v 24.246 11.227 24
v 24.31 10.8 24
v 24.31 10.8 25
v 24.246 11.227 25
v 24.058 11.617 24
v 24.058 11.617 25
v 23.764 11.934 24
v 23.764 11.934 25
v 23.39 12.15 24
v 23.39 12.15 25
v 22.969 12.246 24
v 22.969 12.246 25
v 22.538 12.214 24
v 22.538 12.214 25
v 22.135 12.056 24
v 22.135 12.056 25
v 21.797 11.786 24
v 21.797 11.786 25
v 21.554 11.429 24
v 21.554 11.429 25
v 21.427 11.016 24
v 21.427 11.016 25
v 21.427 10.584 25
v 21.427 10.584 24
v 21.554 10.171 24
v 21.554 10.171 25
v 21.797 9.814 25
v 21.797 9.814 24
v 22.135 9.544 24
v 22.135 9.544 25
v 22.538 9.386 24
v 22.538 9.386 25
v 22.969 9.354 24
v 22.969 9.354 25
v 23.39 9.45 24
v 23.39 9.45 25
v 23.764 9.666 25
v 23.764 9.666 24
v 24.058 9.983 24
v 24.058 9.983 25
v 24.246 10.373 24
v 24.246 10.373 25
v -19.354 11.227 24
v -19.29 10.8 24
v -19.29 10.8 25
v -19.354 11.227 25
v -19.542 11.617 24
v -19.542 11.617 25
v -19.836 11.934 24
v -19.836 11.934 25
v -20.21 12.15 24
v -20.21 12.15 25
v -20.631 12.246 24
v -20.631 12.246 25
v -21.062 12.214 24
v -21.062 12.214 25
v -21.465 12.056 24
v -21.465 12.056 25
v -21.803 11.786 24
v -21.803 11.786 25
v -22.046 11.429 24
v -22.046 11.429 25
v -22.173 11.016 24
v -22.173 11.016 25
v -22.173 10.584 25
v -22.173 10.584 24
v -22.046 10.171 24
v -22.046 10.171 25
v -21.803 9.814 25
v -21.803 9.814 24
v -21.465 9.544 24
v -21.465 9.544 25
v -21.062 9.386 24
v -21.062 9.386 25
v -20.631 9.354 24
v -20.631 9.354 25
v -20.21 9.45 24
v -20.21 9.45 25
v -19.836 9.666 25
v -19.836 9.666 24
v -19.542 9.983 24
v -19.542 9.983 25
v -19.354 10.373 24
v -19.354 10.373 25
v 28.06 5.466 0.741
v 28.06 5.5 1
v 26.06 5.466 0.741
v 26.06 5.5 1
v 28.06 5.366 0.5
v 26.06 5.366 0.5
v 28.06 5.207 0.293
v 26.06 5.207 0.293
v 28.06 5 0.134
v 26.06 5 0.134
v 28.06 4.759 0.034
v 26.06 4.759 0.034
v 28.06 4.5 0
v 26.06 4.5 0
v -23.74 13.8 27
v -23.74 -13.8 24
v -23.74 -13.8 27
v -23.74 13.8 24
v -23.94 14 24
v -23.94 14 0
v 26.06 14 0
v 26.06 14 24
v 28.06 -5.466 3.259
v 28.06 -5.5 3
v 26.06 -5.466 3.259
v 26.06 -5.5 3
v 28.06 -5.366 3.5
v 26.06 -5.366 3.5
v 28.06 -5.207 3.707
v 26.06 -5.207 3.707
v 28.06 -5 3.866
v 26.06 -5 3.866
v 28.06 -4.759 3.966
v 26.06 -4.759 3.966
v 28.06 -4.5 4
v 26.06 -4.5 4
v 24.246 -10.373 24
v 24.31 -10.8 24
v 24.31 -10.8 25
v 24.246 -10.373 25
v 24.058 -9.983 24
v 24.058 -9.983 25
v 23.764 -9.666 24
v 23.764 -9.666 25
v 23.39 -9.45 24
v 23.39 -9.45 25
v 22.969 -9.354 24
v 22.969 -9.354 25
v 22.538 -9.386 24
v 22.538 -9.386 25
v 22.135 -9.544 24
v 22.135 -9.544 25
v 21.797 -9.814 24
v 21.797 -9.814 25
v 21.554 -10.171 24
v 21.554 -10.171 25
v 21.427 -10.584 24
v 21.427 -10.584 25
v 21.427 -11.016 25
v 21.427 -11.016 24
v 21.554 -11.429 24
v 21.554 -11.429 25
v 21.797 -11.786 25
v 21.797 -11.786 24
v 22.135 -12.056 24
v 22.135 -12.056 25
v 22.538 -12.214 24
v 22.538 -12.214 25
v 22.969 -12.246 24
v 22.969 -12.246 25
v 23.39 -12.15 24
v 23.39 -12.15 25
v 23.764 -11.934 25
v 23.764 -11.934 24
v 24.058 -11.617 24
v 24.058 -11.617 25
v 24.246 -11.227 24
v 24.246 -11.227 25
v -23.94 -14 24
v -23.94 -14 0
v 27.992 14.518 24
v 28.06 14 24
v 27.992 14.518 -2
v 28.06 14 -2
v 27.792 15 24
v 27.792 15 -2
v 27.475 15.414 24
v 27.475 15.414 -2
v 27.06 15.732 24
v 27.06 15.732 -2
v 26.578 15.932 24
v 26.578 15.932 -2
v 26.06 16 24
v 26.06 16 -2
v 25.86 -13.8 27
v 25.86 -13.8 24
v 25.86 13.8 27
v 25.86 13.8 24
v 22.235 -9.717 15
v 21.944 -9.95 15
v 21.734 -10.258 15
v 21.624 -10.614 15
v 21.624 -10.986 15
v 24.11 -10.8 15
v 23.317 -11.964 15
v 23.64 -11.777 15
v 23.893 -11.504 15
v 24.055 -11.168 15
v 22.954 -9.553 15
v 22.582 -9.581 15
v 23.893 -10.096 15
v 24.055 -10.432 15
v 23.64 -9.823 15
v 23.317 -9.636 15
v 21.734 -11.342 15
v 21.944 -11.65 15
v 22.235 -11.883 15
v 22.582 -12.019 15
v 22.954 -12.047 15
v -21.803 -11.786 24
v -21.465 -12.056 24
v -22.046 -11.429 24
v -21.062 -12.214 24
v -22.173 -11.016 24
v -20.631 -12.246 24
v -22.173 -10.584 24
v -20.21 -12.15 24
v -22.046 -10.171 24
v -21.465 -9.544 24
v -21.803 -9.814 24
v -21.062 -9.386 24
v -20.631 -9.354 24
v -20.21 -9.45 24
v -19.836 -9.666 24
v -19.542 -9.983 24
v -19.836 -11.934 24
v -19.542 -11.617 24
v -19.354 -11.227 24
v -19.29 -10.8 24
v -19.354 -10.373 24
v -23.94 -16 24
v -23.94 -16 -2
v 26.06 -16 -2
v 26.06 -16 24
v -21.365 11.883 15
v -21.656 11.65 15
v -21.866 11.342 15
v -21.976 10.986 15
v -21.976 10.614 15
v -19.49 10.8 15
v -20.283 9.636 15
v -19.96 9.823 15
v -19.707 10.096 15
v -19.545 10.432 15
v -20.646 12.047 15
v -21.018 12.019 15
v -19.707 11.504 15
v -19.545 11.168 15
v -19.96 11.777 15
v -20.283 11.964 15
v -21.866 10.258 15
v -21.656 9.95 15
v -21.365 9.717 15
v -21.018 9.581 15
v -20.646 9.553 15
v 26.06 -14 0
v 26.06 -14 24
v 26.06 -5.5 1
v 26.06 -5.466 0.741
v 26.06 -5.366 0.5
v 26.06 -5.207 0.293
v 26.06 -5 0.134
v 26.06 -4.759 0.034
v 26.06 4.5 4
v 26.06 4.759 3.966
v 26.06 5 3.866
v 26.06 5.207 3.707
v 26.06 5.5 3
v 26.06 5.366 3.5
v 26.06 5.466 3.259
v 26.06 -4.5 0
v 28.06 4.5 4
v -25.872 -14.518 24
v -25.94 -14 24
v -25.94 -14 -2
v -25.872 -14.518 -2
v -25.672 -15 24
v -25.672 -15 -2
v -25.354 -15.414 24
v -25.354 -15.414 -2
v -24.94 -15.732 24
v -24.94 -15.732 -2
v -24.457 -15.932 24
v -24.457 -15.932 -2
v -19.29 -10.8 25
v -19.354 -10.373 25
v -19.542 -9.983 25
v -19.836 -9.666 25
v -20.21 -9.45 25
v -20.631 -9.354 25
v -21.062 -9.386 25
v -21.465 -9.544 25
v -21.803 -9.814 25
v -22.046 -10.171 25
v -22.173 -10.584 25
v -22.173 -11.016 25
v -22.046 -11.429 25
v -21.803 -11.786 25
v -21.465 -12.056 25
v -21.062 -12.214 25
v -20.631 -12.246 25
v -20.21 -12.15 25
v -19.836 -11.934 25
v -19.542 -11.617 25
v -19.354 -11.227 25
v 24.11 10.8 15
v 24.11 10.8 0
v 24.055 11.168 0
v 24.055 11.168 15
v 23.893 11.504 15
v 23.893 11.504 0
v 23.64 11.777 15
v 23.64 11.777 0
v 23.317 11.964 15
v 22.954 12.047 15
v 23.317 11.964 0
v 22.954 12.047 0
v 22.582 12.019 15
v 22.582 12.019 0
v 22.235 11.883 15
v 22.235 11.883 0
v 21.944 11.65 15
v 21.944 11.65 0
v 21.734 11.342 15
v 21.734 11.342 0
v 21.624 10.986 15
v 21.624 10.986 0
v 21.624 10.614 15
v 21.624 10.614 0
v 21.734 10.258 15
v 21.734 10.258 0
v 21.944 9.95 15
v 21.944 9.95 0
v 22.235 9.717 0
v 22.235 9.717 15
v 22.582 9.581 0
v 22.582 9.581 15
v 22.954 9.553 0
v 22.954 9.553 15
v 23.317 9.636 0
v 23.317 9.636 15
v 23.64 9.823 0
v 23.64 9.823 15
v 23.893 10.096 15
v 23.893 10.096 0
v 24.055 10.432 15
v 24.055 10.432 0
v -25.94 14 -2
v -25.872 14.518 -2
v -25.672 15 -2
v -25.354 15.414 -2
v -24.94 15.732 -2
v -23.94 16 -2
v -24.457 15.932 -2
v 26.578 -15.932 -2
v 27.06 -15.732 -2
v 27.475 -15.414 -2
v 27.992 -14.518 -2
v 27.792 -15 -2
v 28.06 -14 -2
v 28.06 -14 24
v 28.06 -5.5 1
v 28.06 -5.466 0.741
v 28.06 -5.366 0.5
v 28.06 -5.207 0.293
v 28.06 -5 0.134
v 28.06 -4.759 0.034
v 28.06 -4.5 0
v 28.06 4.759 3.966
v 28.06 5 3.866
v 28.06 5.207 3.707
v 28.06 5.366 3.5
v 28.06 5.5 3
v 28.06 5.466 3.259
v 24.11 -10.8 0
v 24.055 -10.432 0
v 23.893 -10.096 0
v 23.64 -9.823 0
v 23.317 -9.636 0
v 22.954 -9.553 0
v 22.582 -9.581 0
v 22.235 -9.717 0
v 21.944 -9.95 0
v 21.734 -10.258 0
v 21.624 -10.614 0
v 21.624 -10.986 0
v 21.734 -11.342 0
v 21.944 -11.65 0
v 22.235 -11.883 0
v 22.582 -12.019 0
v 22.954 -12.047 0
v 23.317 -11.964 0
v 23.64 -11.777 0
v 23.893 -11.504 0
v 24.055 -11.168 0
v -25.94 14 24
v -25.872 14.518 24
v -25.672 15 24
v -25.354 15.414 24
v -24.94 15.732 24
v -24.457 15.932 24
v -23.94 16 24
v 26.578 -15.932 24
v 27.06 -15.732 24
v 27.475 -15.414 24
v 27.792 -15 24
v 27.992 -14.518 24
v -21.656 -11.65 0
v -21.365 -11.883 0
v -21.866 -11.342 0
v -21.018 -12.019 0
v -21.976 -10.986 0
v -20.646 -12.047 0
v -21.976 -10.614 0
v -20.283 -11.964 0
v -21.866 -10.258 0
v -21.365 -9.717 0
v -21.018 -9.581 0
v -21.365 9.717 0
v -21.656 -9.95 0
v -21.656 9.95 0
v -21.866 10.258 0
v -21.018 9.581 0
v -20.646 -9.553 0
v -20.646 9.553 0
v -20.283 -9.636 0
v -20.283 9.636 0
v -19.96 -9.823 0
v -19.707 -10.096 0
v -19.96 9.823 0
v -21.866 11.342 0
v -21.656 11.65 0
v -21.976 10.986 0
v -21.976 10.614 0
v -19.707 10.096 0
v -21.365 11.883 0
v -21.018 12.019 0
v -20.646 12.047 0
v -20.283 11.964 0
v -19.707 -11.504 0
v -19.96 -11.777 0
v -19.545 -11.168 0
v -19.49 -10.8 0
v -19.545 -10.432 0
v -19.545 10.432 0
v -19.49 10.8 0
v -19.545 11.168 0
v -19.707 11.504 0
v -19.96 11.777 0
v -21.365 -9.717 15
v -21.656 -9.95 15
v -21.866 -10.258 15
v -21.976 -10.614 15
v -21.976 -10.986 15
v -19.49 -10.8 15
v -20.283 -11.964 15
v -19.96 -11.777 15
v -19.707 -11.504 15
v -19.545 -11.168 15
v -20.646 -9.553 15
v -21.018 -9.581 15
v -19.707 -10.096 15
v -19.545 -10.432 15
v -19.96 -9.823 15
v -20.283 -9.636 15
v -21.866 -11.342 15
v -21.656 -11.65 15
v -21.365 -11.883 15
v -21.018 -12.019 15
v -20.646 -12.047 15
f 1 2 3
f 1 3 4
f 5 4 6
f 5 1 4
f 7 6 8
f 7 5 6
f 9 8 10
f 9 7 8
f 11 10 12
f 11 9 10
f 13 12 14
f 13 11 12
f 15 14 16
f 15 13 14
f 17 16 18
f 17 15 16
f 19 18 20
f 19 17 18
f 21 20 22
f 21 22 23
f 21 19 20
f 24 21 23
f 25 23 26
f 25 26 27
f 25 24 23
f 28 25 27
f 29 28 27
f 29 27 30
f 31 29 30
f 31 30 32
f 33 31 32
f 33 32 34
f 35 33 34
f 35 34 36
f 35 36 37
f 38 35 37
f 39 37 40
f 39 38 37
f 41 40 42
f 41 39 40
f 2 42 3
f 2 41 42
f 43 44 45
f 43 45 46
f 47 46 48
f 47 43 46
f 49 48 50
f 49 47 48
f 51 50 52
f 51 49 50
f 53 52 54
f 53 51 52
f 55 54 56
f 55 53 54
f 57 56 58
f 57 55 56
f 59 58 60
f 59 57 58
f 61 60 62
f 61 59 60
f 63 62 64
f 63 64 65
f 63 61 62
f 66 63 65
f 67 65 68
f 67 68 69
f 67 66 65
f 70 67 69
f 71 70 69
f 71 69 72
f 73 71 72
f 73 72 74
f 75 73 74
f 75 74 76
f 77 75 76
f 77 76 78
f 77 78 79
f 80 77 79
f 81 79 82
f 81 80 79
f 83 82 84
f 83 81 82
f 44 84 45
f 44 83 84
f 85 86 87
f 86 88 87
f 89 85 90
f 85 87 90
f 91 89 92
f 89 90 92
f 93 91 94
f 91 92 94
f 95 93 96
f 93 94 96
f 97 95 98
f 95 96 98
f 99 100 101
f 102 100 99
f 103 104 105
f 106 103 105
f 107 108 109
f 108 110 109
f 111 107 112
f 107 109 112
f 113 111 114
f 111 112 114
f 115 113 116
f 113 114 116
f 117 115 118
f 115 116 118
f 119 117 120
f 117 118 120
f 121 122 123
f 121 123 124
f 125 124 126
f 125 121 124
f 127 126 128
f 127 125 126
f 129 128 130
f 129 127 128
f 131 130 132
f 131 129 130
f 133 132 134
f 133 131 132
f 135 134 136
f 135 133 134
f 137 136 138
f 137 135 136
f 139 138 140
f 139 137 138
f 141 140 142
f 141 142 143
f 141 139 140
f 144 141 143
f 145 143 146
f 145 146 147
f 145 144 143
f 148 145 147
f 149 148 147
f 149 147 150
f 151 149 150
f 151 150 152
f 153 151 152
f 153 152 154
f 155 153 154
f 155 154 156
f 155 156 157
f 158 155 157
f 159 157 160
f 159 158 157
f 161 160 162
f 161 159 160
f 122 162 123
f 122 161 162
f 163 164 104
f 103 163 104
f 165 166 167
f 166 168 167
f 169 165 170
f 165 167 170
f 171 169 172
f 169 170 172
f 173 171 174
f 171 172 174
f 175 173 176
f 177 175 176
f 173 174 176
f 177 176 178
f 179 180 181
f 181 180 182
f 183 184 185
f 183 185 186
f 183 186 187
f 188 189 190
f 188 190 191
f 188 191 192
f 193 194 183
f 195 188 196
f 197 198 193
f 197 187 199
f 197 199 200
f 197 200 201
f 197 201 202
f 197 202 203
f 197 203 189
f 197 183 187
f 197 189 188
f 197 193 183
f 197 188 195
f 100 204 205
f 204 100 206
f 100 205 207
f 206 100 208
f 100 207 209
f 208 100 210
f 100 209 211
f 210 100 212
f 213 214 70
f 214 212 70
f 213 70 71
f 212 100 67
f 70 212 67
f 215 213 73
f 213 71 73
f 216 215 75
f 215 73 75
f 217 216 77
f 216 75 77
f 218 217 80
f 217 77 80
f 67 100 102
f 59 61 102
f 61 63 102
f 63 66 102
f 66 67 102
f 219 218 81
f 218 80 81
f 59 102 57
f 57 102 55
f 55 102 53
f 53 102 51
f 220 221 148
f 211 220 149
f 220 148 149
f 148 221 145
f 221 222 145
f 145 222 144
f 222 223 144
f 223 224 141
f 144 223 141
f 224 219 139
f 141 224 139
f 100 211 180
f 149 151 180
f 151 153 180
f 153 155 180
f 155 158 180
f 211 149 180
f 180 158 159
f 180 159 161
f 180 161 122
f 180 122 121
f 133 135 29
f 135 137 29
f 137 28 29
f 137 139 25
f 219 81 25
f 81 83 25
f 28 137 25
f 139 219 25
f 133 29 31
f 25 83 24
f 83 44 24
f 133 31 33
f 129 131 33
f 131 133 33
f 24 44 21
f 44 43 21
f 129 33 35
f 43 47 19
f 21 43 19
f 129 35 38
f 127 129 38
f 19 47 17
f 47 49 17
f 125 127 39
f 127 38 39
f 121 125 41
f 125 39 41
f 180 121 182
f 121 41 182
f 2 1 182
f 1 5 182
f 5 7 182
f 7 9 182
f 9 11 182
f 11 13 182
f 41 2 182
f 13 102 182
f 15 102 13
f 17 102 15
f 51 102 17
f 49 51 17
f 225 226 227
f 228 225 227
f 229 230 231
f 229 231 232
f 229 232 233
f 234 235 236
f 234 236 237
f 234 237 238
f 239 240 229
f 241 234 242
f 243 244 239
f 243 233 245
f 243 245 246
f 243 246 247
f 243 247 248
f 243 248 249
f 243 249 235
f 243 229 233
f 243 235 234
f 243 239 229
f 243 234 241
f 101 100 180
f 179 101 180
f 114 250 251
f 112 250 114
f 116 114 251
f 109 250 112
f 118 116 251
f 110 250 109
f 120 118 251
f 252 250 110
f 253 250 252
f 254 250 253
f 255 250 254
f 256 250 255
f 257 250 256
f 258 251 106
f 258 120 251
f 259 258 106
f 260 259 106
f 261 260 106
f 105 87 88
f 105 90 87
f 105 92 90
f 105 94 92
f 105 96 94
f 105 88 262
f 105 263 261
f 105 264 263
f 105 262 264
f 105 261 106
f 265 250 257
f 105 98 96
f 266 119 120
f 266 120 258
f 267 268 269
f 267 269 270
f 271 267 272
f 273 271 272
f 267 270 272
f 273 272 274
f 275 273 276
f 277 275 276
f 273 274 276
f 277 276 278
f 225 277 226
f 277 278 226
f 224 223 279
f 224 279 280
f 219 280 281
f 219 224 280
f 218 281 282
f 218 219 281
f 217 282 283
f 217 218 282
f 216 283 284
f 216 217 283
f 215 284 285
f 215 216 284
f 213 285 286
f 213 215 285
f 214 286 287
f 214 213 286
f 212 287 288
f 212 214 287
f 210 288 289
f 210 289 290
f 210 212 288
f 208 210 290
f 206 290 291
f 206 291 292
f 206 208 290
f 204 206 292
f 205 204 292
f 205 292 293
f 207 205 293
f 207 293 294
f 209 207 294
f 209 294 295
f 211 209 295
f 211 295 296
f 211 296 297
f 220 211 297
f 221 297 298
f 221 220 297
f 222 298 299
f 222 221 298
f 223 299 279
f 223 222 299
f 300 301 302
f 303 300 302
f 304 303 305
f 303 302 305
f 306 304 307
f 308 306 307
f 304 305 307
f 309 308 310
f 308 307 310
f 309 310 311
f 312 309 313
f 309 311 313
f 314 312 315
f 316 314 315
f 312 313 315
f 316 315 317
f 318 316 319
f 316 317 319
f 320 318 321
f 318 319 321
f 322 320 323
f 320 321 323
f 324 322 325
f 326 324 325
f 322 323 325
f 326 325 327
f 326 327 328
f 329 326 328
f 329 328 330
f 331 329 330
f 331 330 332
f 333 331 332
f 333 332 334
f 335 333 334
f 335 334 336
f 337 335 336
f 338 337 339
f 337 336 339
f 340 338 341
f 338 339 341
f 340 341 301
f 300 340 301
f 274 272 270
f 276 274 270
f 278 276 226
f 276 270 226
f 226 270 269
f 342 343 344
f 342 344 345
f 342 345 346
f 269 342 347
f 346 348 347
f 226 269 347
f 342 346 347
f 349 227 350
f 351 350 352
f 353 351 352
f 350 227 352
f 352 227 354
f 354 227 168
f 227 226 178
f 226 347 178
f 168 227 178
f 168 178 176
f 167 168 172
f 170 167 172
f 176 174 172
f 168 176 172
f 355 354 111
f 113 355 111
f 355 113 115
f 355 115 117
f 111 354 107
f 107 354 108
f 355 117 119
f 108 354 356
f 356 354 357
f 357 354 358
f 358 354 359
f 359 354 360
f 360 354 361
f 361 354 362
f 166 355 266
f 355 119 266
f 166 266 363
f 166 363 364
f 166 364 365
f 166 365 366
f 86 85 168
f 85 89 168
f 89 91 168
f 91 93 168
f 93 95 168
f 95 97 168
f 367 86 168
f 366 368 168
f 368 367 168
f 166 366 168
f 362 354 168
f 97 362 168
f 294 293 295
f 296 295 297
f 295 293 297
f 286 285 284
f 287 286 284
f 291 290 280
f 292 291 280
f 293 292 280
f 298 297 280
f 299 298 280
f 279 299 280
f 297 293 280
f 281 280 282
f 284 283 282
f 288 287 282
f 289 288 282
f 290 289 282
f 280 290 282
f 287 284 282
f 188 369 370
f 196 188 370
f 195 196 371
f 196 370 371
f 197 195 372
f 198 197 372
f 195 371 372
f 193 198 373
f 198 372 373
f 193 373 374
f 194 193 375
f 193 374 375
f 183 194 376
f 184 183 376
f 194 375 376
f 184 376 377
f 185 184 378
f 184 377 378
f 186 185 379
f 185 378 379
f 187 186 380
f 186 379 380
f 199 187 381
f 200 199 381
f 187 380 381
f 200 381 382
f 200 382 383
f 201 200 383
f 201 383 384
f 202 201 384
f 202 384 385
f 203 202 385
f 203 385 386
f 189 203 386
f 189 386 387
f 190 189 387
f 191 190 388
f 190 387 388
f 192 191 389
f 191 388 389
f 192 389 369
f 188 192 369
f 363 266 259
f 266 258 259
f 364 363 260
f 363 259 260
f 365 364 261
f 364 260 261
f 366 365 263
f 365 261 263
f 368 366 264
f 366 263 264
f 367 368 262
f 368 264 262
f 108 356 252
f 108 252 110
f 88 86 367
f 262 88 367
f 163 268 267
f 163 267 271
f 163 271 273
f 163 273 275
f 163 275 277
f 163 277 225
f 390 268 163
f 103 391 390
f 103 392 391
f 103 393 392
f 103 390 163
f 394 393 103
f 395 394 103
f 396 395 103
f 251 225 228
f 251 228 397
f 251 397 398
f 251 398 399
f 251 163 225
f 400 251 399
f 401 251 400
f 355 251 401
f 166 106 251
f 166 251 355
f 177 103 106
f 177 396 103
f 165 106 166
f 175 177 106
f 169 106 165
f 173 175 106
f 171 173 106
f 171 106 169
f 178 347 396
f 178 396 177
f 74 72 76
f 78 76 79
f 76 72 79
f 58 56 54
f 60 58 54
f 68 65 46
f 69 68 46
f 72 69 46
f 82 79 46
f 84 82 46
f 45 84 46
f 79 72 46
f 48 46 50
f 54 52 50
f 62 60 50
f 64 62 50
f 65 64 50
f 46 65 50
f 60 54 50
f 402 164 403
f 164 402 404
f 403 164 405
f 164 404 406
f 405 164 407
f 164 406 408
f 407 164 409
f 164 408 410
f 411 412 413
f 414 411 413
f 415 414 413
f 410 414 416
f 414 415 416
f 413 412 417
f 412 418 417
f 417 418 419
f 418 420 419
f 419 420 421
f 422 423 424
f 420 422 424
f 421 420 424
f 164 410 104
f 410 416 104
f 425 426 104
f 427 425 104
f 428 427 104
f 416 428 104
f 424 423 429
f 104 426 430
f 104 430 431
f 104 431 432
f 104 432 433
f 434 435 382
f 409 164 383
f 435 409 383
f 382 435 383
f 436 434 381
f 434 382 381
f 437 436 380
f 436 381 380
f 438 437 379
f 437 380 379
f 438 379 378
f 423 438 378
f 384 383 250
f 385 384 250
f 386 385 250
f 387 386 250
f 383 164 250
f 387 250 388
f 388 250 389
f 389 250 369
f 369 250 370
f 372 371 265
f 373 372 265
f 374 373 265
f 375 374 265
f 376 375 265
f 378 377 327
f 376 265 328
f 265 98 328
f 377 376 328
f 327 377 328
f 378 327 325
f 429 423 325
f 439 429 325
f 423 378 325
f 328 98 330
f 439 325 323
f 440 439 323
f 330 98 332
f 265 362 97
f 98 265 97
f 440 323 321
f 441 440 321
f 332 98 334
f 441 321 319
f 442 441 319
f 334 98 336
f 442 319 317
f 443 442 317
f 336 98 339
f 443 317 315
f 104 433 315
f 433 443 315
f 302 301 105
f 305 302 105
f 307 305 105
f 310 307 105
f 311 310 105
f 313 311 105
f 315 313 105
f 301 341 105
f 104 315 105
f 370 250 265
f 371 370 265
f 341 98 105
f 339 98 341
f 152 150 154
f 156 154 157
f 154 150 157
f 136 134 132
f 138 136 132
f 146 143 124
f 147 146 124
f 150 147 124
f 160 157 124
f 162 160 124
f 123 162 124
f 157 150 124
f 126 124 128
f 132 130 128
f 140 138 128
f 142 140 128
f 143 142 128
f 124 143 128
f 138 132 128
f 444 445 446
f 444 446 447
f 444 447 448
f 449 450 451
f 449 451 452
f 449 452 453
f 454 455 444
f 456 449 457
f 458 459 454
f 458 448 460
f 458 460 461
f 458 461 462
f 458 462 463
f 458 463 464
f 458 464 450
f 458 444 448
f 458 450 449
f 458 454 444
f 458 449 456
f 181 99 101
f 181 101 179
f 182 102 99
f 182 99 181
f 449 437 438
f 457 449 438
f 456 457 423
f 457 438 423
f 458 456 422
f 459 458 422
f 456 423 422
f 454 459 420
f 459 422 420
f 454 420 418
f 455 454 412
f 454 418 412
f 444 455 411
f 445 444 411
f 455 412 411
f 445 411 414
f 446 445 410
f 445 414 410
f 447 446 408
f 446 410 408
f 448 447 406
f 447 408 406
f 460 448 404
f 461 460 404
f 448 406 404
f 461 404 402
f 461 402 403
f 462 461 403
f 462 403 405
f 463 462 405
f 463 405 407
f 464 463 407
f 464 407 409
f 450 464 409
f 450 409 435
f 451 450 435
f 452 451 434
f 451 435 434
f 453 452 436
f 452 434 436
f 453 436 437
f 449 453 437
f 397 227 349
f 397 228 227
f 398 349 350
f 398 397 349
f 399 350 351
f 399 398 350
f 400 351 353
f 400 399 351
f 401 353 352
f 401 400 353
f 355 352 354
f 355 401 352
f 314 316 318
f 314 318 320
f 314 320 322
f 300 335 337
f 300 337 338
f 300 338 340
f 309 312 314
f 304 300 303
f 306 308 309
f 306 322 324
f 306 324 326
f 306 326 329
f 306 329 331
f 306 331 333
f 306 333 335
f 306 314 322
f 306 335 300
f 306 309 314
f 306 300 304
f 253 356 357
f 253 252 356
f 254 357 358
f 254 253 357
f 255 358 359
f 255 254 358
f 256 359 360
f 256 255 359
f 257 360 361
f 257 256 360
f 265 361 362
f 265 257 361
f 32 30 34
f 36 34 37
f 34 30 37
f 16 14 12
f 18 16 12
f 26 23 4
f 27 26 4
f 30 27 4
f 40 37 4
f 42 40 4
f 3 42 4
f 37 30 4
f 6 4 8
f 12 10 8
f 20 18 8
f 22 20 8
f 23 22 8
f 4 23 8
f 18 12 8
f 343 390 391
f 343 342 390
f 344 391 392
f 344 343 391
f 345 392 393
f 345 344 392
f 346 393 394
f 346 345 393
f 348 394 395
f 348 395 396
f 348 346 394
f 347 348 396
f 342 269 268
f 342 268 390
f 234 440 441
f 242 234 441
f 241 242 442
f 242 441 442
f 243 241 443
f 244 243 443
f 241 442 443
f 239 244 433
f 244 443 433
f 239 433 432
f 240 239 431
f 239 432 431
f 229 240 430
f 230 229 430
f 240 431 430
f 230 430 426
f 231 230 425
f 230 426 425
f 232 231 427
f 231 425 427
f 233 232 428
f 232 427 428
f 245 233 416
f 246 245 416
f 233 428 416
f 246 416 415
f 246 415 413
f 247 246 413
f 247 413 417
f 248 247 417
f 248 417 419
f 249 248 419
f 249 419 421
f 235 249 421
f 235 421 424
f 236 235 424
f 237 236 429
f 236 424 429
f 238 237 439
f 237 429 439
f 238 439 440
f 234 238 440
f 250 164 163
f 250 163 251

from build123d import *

# Parameters (mm, degrees)
F1_W      = 50
F1_H      = 28
F1_R      = 1.25
F2_DEPTH  = 24
F3_T      = 2
F4_DEPTH  = 15
F5_R      = 2
F6_W      = 11
F6_H      = 4
F7_DEPTH  = 2
F8_R      = 1
F9_W      = 49.6
F9_H      = 27.6
F9_R      = 1.45
F10_DEPTH = 3
F11_DEPTH = 1


with BuildPart() as f2:
    # F1 (on Top) → F2 (new body)
    with BuildSketch(Plane.XY):
        with Locations((1.0603448276, 0)):
            Rectangle(F1_W, F1_H)
        with Locations((-20.7396551724, -10.8)):
            Circle(F1_R, mode=Mode.SUBTRACT)
        with Locations((22.8603448276, -10.8)):
            Circle(F1_R, mode=Mode.SUBTRACT)
        with Locations((-20.7396551724, 10.8)):
            Circle(F1_R, mode=Mode.SUBTRACT)
        with Locations((22.8603448276, 10.8)):
            Circle(F1_R, mode=Mode.SUBTRACT)
        with Locations((22.8603448276, -10.8)):
            Circle(F1_R)
        with Locations((-20.7396551724, -10.8)):
            Circle(F1_R)
        with Locations((-20.7396551724, 10.8)):
            Circle(F1_R)
        with Locations((22.8603448276, 10.8)):
            Circle(F1_R)
    extrude(amount=F2_DEPTH)

    # F3
    f3_openings = [f2.faces().sort_by_distance(p)[0] for p in [
        (1.060345, 0, 24),
    ]]
    offset(amount=F3_T, openings=f3_openings, kind=Kind.INTERSECTION)

    # F1 (on Top) → F4 (join)
    with BuildSketch(Plane.XY):
        with Locations((-20.7396551724, -10.8)):
            Circle(F1_R)
        with Locations((-20.7396551724, 10.8)):
            Circle(F1_R)
        with Locations((22.8603448276, -10.8)):
            Circle(F1_R)
        with Locations((22.8603448276, 10.8)):
            Circle(F1_R)
    extrude(amount=F4_DEPTH)

    # F5
    f5_edges = [f2.edges().sort_by_distance(p)[0] for p in [
        (28.060345, -16, 11),
        (-25.939655, -16, 11),
        (28.060345, 16, 11),
        (-25.939655, 16, 11),
    ]]
    fillet(f5_edges, radius=F5_R)

    # F6 (on face) → F7 (cut)
    with BuildSketch(Plane.YZ.offset(28.0603448276)):
        with Locations((0, 2)):
            Rectangle(F6_W, F6_H)
    extrude(amount=-F7_DEPTH, mode=Mode.SUBTRACT)

    # F8
    f8_edges = [f2.edges().sort_by_distance(p)[0] for p in [
        (27.060345, 5.5, 4),
        (27.060345, -5.5, 4),
        (27.060345, 5.5, 0),
        (27.060345, -5.5, 0),
    ]]
    fillet(f8_edges, radius=F8_R)


with BuildPart() as f10:
    # F9 (on face) → F10 (new body)
    with BuildSketch(Plane.XY.offset(24)):
        with Locations((1.0603448276, 0)):
            Rectangle(F9_W, F9_H)
        with Locations((-20.7396551724, -10.8)):
            Circle(F9_R, mode=Mode.SUBTRACT)
        with Locations((22.8603448276, -10.8)):
            Circle(F9_R, mode=Mode.SUBTRACT)
        with Locations((-20.7396551724, 10.8)):
            Circle(F9_R, mode=Mode.SUBTRACT)
        with Locations((22.8603448276, 10.8)):
            Circle(F9_R, mode=Mode.SUBTRACT)
        with Locations((-20.7396551724, -10.8)):
            Circle(F9_R)
        with Locations((22.8603448276, -10.8)):
            Circle(F9_R)
        with Locations((22.8603448276, 10.8)):
            Circle(F9_R)
        with Locations((-20.7396551724, 10.8)):
            Circle(F9_R)
    extrude(amount=F10_DEPTH)

    # F9 (on face) → F11 (cut)
    with BuildSketch(Plane.XY.offset(24)):
        with Locations((-20.7396551724, -10.8)):
            Circle(F9_R)
        with Locations((-20.7396551724, 10.8)):
            Circle(F9_R)
        with Locations((22.8603448276, 10.8)):
            Circle(F9_R)
        with Locations((22.8603448276, -10.8)):
            Circle(F9_R)
    extrude(amount=F11_DEPTH, mode=Mode.SUBTRACT)


solid = Compound([f2.part, f10.part])
